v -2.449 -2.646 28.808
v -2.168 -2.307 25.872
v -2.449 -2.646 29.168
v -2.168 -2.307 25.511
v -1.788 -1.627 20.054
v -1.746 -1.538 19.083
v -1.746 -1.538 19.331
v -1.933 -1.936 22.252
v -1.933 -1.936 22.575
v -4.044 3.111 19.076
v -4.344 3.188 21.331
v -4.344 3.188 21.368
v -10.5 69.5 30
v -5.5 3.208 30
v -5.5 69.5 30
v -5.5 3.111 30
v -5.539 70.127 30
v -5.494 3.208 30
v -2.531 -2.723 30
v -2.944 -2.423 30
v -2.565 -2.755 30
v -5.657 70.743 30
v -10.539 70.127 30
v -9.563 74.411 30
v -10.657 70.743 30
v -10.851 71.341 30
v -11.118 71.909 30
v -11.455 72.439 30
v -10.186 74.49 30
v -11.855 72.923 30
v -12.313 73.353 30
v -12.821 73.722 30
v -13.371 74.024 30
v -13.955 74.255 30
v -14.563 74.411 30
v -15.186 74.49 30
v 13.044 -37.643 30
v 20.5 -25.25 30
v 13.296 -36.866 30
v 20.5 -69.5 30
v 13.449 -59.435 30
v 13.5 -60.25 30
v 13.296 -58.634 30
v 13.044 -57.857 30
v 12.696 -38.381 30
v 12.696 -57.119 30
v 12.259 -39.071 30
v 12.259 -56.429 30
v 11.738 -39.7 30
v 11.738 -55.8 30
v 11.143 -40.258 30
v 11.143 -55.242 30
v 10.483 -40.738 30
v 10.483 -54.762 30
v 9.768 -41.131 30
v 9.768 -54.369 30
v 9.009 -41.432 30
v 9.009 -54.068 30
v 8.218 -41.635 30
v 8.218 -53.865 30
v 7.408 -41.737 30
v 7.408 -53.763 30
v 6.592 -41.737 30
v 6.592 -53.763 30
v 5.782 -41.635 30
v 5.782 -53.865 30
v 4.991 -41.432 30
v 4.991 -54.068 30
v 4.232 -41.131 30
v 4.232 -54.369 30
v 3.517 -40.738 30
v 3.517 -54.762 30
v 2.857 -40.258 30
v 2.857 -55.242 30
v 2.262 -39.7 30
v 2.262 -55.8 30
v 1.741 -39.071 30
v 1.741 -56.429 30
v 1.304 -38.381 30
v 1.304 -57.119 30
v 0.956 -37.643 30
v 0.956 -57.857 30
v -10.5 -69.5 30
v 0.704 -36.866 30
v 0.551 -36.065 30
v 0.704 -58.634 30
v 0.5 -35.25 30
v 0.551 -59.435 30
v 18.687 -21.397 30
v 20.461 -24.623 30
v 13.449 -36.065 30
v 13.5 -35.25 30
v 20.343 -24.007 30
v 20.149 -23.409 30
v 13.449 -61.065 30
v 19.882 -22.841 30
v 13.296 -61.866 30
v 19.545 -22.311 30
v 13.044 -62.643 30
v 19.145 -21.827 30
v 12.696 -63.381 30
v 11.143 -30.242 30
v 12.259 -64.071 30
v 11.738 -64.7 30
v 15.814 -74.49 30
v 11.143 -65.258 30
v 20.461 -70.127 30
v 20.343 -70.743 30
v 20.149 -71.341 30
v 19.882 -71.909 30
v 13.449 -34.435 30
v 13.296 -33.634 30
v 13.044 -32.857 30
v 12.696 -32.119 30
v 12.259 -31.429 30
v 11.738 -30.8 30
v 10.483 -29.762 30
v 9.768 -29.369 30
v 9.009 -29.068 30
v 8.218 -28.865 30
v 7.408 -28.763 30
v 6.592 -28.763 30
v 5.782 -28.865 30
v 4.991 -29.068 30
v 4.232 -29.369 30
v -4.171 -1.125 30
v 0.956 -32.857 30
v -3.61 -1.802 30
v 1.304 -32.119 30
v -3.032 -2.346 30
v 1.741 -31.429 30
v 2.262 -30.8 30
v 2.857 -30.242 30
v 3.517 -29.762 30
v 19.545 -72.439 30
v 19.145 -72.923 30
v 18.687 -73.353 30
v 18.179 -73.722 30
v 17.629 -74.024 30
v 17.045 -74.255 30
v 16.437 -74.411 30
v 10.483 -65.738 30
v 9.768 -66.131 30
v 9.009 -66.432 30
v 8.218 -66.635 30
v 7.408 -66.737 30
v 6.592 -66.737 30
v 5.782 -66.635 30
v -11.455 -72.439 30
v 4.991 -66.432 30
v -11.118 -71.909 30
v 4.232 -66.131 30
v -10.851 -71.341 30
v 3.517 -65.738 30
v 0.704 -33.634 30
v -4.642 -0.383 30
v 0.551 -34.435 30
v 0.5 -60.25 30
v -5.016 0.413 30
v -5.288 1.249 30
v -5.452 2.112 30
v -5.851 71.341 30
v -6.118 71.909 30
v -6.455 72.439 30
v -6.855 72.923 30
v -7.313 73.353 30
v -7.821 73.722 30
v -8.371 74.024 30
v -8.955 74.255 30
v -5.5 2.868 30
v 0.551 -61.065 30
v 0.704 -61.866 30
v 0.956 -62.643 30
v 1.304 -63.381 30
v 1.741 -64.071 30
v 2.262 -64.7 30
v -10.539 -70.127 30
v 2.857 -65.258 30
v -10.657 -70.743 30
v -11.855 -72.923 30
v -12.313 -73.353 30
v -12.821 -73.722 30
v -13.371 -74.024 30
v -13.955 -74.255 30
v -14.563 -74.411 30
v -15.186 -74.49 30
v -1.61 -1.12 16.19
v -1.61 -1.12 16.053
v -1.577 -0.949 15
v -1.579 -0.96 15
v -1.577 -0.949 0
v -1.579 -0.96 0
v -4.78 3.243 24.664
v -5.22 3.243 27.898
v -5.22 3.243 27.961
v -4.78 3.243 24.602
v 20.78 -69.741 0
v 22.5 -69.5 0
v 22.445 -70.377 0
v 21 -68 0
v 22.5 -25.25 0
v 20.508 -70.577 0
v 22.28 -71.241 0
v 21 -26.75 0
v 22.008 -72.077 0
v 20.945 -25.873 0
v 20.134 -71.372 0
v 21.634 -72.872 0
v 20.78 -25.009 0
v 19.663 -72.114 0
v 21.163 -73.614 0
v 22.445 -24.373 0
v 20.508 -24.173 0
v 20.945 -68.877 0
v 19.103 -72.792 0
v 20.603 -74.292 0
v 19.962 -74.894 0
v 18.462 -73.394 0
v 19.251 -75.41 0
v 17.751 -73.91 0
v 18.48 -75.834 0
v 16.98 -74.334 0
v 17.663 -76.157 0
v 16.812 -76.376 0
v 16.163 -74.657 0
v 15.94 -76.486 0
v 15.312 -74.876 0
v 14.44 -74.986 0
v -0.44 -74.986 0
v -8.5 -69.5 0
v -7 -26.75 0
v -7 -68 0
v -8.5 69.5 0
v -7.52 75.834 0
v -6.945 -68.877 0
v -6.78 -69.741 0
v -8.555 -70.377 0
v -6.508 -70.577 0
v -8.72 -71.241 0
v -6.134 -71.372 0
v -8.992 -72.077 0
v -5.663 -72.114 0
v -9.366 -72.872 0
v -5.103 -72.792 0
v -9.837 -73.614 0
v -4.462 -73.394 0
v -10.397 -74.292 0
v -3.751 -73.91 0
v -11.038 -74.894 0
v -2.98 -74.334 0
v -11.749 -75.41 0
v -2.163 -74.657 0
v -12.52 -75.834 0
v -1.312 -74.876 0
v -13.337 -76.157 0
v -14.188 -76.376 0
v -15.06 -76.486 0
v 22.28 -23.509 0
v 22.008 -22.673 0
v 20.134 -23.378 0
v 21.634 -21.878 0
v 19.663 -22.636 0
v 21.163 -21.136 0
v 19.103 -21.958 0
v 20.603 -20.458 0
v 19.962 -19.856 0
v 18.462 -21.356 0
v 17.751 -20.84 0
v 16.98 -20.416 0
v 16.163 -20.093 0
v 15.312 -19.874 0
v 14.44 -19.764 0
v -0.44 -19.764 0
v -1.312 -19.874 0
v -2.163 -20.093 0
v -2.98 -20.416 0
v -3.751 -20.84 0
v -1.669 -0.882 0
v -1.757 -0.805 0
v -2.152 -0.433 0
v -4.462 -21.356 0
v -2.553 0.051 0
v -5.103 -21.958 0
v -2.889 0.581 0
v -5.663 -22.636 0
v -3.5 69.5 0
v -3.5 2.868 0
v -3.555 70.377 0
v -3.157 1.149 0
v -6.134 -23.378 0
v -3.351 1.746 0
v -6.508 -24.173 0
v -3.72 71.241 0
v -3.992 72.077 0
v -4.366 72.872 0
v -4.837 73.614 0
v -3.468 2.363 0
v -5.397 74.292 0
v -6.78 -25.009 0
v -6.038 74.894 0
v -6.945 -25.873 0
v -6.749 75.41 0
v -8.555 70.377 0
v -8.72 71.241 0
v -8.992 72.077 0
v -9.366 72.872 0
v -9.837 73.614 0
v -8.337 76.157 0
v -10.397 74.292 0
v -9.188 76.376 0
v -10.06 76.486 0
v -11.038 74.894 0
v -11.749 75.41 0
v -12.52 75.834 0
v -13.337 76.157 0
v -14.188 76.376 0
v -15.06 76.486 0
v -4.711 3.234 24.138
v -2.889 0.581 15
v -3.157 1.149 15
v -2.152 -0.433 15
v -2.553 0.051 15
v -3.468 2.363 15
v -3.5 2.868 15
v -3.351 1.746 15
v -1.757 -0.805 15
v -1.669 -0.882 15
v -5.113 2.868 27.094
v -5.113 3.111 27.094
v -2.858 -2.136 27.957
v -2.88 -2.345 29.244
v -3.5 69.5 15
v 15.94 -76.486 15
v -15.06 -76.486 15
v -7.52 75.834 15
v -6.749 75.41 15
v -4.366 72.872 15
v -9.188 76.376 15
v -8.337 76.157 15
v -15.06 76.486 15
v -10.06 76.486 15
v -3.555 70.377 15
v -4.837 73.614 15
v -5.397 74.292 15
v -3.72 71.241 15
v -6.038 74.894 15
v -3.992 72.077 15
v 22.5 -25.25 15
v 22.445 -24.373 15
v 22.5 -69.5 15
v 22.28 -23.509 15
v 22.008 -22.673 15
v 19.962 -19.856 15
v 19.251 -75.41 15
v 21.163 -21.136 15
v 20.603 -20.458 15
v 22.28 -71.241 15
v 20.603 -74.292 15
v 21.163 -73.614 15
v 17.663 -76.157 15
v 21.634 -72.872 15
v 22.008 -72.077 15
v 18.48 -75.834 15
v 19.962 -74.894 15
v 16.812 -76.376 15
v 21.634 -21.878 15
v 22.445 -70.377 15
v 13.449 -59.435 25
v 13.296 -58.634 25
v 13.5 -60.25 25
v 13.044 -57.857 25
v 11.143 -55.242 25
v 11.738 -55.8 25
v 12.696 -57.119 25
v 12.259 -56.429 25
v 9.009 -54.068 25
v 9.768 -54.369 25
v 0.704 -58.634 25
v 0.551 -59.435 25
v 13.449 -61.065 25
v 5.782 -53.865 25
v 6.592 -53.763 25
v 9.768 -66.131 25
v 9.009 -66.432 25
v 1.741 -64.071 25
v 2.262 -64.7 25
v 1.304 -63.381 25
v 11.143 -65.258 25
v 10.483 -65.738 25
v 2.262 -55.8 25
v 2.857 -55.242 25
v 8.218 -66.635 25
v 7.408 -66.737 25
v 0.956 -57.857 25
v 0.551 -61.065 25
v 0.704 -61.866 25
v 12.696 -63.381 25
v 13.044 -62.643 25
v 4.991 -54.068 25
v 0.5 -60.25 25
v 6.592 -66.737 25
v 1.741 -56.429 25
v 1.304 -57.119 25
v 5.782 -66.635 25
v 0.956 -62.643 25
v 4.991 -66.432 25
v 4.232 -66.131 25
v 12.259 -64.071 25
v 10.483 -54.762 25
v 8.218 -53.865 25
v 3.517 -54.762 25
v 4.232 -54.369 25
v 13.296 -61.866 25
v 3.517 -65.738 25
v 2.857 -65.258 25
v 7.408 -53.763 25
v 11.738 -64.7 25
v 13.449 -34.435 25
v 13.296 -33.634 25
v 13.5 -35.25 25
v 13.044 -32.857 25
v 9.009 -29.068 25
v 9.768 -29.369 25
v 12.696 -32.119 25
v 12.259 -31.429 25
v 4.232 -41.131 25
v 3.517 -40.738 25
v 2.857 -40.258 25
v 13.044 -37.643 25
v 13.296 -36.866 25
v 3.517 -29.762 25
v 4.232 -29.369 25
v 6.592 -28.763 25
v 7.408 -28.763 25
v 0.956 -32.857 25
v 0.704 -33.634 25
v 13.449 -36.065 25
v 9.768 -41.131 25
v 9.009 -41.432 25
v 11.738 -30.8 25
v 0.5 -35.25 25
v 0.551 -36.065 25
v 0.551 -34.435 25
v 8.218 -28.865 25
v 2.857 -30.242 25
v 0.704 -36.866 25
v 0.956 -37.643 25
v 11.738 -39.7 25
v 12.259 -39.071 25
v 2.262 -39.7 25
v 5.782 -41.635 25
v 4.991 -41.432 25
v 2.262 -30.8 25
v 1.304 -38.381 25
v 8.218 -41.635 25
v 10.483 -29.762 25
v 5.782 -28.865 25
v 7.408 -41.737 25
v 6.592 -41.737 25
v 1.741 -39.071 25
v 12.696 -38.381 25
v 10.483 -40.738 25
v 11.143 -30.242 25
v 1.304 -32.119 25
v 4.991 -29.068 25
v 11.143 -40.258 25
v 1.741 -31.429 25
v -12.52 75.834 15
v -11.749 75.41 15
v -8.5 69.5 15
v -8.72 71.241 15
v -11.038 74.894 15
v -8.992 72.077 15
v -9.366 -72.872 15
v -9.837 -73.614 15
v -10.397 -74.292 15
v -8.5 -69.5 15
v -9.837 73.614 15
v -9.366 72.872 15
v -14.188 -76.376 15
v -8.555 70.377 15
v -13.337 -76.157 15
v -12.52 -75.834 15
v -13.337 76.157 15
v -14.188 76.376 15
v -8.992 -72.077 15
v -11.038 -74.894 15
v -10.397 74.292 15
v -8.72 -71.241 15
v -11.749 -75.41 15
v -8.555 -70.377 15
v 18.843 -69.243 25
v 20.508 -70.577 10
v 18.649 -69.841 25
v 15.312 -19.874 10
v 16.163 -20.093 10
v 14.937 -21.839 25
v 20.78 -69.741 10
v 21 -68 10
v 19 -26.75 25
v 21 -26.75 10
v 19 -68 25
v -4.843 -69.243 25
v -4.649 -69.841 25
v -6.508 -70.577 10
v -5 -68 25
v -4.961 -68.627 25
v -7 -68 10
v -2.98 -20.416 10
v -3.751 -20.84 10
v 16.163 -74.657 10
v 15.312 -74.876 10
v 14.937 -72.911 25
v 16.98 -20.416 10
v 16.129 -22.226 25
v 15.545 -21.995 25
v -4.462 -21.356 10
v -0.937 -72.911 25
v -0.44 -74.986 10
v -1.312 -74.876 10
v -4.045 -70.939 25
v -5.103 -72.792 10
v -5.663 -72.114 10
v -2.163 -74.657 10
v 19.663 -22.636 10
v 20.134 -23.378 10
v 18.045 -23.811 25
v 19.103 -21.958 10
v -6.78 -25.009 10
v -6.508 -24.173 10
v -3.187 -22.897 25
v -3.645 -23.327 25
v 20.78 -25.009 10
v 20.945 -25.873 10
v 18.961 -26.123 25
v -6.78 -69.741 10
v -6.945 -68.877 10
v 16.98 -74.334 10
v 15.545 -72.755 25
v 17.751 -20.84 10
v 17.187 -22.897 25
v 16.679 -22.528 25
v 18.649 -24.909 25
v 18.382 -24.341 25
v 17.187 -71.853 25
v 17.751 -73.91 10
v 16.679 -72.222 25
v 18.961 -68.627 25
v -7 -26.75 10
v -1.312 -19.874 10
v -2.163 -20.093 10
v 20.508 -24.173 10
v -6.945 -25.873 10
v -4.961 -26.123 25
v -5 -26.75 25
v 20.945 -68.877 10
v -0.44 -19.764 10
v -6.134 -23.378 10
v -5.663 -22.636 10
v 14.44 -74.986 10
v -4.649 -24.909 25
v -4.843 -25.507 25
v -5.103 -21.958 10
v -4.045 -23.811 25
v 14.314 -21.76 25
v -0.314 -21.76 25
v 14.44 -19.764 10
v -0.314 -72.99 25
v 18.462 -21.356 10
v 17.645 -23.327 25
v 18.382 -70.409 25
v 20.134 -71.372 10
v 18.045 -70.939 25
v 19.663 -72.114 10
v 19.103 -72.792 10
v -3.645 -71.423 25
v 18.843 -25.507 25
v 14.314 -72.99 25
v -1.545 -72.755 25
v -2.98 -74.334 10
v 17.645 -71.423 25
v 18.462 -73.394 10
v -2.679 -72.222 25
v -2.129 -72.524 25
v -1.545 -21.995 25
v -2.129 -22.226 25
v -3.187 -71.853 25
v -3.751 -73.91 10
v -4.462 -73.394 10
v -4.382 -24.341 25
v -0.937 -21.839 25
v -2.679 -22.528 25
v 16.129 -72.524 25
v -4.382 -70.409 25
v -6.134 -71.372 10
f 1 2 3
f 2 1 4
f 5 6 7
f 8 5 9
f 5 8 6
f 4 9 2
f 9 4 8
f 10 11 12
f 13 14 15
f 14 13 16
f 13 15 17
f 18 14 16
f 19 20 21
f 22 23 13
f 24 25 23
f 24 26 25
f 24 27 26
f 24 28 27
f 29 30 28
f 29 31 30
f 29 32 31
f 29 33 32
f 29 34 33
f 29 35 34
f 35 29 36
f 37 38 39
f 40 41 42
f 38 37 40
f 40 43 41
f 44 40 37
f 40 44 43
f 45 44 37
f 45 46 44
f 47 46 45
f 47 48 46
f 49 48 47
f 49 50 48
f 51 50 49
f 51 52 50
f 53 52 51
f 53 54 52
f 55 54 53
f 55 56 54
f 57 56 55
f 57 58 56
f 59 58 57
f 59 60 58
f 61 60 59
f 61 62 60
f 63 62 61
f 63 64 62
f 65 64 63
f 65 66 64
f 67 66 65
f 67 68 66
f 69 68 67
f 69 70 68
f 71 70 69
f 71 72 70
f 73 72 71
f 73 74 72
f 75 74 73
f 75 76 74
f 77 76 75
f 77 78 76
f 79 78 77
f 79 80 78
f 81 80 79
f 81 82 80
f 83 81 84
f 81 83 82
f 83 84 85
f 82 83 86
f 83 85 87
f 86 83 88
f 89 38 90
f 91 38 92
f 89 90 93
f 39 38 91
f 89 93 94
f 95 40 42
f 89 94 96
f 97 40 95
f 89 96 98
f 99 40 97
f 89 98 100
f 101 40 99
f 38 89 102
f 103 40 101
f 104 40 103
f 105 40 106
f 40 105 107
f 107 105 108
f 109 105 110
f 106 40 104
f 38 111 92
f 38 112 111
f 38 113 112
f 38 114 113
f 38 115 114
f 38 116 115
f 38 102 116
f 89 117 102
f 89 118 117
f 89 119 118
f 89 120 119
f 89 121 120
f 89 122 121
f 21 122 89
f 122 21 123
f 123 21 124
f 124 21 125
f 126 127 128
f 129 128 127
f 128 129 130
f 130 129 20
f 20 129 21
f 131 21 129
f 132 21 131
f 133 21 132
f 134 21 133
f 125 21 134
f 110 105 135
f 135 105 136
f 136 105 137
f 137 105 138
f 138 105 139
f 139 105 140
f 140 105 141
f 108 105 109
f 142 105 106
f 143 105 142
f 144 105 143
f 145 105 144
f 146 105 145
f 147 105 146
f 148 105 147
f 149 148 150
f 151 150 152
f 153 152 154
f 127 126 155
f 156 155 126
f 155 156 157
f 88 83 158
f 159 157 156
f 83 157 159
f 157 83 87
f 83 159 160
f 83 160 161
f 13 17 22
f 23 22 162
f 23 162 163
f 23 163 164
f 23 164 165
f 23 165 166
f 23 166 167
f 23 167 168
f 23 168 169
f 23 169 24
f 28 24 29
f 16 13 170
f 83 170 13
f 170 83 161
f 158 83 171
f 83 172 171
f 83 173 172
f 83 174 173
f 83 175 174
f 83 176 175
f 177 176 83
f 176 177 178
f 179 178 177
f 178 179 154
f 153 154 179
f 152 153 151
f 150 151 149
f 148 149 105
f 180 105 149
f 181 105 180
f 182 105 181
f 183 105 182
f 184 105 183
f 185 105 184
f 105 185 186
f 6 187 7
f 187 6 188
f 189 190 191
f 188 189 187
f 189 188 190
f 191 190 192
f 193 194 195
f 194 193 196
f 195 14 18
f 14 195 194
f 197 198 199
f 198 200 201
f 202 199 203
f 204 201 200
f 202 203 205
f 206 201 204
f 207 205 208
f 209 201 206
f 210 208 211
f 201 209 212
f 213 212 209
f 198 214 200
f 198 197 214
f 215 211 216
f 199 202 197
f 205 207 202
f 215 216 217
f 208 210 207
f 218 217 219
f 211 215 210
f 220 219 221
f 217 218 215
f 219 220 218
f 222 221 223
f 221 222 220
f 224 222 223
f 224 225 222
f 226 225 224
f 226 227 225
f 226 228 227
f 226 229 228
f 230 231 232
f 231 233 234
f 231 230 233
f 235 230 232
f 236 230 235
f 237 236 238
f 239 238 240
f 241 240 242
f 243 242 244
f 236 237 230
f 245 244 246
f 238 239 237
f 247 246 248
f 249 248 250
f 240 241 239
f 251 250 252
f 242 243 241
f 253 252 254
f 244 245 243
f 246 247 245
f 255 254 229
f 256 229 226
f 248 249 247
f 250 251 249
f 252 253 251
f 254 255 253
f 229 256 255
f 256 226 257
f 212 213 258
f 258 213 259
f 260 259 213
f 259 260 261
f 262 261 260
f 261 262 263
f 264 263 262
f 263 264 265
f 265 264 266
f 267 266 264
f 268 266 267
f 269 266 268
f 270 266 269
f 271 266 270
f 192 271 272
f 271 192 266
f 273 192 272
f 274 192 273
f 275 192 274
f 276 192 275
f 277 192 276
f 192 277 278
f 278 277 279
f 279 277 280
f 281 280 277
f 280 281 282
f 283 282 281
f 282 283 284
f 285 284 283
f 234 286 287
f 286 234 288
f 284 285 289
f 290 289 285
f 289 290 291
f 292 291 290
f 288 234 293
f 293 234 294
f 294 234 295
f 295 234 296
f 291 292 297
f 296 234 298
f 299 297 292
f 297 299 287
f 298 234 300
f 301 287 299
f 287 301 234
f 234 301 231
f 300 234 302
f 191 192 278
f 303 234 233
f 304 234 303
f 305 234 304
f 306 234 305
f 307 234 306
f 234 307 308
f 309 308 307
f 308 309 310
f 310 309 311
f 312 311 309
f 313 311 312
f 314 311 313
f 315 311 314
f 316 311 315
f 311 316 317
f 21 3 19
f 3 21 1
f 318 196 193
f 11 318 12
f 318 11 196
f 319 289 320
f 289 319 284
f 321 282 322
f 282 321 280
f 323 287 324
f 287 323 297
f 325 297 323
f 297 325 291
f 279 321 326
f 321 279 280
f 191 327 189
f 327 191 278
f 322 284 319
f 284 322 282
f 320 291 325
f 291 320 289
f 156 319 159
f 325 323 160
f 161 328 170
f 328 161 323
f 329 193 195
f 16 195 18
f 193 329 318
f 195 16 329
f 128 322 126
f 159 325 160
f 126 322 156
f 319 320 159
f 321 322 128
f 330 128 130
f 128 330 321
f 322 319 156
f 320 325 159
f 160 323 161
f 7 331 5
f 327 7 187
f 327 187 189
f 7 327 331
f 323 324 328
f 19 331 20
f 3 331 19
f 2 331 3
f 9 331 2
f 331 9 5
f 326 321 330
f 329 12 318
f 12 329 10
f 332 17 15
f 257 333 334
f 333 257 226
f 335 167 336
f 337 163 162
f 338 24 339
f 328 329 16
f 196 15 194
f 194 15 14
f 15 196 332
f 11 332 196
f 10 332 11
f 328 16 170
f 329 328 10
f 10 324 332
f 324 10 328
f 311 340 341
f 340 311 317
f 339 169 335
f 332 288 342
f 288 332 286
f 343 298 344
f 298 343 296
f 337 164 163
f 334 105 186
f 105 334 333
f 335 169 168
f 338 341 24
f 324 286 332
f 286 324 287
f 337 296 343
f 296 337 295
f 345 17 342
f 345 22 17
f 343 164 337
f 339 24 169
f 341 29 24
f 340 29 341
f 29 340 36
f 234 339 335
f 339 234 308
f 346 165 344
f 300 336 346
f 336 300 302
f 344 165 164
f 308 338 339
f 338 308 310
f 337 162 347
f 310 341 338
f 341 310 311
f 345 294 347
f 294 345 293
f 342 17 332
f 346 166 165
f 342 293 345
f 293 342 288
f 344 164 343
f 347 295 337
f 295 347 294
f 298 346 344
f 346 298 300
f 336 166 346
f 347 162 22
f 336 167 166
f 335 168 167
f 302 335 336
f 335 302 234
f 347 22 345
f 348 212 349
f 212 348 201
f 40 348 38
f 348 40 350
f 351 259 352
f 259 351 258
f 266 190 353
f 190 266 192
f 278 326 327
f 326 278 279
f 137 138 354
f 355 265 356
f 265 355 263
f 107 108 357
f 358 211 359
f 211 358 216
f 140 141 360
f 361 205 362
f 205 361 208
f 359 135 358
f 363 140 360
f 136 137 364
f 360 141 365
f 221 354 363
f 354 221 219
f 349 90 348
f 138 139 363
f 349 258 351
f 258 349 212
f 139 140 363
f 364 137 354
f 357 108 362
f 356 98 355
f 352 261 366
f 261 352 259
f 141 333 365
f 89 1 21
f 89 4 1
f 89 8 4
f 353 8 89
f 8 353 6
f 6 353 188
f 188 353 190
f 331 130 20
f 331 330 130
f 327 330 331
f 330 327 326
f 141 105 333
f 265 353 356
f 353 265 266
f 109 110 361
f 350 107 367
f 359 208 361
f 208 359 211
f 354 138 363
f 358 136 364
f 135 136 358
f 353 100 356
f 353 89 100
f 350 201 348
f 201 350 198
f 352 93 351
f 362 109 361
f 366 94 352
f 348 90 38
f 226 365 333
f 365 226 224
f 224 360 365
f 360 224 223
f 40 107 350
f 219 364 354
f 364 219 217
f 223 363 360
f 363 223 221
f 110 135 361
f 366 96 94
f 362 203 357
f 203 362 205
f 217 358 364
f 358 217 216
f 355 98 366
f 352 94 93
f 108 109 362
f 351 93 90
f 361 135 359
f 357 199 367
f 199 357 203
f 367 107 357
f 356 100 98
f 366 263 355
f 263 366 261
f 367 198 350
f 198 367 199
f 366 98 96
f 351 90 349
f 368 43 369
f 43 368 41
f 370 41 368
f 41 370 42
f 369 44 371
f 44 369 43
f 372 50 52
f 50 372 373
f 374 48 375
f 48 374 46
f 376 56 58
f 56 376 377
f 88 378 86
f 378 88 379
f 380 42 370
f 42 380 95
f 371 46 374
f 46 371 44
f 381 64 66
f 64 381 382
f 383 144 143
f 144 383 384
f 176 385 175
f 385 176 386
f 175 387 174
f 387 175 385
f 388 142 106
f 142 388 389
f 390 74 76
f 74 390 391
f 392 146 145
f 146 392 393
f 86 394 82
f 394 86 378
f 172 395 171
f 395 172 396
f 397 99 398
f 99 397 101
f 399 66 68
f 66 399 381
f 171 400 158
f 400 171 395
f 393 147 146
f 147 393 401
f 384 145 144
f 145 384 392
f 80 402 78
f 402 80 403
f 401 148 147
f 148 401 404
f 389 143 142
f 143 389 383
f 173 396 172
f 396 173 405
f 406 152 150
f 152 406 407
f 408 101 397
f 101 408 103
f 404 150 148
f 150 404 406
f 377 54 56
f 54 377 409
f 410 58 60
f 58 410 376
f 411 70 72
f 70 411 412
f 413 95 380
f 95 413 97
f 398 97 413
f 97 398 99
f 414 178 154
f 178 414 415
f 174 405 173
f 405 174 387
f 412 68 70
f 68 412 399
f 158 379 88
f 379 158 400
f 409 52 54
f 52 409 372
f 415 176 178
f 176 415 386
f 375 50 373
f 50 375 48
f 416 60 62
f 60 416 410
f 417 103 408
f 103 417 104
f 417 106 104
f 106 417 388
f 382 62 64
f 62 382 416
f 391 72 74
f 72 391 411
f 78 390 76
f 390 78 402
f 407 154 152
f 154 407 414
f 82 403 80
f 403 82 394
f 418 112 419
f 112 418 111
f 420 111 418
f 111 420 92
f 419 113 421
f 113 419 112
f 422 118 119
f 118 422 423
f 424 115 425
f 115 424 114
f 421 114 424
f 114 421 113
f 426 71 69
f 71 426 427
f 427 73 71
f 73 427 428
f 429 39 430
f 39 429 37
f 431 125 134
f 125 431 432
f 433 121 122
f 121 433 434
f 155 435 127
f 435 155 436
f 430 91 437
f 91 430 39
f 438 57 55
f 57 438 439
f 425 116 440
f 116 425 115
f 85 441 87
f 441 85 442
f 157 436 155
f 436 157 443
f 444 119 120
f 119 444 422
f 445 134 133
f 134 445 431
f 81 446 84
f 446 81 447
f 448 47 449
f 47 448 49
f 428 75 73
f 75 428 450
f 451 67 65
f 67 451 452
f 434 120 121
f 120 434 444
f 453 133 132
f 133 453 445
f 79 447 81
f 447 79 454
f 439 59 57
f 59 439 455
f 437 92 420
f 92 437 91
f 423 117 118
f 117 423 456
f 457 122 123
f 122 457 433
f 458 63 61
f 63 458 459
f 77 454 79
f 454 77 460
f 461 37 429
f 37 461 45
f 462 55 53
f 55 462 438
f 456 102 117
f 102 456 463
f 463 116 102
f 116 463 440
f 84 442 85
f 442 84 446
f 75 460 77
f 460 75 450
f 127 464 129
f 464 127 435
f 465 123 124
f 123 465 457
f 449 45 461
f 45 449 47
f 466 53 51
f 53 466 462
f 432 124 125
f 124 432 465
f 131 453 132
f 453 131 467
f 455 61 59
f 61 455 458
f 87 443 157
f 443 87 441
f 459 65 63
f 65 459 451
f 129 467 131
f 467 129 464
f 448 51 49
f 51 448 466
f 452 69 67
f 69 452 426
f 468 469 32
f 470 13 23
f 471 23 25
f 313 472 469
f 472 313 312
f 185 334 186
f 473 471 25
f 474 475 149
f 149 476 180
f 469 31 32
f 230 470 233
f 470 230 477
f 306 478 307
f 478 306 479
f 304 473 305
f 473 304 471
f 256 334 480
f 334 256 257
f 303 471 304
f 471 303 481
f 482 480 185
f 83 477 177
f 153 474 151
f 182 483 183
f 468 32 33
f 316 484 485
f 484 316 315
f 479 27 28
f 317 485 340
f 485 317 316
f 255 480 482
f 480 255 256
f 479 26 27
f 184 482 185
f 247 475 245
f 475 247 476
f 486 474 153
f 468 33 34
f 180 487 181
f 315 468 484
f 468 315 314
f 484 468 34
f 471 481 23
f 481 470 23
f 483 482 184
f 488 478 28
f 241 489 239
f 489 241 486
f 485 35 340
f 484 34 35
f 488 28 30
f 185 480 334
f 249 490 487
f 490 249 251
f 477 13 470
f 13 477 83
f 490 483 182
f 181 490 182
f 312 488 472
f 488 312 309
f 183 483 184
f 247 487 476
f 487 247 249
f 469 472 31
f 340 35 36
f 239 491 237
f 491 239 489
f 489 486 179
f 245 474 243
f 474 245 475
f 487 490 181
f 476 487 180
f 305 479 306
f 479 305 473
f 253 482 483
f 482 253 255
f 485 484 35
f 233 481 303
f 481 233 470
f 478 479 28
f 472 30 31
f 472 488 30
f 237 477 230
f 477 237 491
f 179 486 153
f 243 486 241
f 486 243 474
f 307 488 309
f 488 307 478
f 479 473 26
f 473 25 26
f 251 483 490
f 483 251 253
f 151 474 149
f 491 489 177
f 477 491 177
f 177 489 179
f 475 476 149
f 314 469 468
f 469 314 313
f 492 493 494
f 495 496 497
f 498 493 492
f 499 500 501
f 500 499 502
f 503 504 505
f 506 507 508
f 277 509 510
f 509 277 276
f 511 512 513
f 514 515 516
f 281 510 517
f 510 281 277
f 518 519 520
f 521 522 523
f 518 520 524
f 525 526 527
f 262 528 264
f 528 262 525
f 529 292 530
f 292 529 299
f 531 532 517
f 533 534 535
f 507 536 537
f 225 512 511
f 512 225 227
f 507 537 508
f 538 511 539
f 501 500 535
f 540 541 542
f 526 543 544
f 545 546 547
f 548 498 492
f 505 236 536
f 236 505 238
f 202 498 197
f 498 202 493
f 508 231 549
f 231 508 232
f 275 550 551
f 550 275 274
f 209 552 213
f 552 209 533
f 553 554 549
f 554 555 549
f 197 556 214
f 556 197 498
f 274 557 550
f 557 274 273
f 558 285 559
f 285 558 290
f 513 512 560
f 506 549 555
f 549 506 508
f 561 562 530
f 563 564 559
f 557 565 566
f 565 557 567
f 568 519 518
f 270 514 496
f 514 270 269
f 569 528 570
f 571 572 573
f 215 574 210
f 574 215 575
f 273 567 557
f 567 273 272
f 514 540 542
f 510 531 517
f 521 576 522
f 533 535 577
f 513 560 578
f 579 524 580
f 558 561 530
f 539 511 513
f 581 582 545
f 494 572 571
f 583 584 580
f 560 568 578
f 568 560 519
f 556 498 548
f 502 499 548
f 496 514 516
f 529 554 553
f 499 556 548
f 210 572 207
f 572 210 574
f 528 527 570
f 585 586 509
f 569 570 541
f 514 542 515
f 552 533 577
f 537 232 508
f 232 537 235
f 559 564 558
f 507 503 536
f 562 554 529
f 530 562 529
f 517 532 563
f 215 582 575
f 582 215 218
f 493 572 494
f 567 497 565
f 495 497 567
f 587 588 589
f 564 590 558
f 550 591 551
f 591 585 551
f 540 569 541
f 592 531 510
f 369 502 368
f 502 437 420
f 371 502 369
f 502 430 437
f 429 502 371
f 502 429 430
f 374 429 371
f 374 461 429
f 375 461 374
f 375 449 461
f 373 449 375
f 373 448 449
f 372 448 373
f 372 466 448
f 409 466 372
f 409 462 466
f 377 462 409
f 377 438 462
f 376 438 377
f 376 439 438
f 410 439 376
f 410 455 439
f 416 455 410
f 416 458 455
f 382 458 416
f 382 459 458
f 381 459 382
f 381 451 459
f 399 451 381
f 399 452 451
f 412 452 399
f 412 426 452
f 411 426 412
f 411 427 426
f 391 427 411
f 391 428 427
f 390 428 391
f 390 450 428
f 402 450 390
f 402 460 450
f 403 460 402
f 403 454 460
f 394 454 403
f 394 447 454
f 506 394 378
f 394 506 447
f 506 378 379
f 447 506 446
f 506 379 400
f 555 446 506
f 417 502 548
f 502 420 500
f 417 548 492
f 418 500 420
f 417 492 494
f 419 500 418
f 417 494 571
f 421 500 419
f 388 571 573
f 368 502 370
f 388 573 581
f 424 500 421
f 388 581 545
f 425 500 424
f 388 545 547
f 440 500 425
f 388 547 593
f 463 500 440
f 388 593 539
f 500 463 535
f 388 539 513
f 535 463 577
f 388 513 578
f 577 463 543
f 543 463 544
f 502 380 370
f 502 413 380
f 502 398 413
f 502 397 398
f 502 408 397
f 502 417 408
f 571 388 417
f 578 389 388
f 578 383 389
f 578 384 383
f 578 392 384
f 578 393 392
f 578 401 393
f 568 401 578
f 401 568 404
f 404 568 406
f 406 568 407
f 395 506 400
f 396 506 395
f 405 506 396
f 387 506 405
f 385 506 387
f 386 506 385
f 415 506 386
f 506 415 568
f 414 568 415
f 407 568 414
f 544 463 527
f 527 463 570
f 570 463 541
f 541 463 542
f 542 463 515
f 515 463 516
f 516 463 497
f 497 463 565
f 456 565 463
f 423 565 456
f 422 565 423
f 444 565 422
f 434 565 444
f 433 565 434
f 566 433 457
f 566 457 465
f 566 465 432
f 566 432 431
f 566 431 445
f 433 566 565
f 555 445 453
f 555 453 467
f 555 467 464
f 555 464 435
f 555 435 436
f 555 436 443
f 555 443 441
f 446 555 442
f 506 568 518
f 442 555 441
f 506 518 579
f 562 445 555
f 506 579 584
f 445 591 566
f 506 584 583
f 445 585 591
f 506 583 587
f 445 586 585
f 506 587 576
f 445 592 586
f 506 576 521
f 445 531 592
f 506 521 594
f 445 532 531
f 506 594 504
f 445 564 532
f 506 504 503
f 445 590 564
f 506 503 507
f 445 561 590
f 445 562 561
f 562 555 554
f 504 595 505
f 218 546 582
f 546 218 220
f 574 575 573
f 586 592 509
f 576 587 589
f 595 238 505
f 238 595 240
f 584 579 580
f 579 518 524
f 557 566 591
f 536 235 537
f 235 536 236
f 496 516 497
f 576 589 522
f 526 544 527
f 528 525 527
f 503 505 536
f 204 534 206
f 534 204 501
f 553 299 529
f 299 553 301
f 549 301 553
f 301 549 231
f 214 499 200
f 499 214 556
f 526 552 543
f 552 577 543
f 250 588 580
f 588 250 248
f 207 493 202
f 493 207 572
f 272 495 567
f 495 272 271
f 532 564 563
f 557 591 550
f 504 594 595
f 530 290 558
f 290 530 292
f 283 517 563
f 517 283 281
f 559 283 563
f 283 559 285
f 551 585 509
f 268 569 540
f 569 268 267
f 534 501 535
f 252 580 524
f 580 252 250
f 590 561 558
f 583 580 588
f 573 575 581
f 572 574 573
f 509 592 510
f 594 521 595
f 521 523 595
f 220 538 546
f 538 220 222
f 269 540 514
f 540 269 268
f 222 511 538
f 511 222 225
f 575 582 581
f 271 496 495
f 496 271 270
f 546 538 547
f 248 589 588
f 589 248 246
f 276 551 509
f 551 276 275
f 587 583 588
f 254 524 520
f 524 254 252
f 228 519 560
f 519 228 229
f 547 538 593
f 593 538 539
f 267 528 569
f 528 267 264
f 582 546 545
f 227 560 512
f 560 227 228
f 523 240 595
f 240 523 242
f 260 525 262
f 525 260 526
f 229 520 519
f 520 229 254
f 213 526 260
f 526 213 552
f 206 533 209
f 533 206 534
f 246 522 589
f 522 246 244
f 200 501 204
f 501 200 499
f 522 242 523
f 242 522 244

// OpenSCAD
WALL_THICKNESS = 1.5;
PANEL_THICKNESS = 5;

DIA_TOP = 10;
DIA_BOT = 14;

LENGTH = 153;
WIDTH = 45;
HEIGHT = 15;

BNC_HOLE_DIA = 13;
BNC_HOLES = 2;
BNC_HOLE_SPACING = 25;
BNC_HOLE_OFFSET = 20 + BNC_HOLE_SPACING/2;


$fn = 50;

module outline() {
    cylinder(d = DIA_BOT, h = HEIGHT);
    translate([0, 0, HEIGHT])
    cylinder(d1 = DIA_BOT, d2 = DIA_TOP, h = HEIGHT);
}

module unit(w = WIDTH - DIA_BOT, l = LENGTH - DIA_BOT) {
  hull() {
    for(i = [-1, 1]) {
      for(j = [-1, 1]) {
        translate([i * w/2, j * l/2, 0])
        outline();
      }
    }
  }
}

module body() {
  union() {
    width = DIA_TOP/2;
    offset_w = -(WIDTH - DIA_BOT - width)/2;
    translate([offset_w, 0, 0])
    unit(w = width);

    length = (BNC_HOLES - 1) * BNC_HOLE_SPACING + BNC_HOLE_OFFSET/2 + 2 * WALL_THICKNESS;

    offset_l = -(LENGTH - DIA_BOT - length)/2;
    bend = offset_l + length/2 + BNC_HOLE_SPACING;

    hull() {
      translate([0, offset_l, 0])
      unit(l = length);

      #translate([offset_w, bend, 0])
      outline();
    }

    // This whole fillet is a giant mess.
    translate([offset_w, bend, 0])
    difference() {
      r = DIA_TOP/2 + DIA_BOT/2 + WALL_THICKNESS * 2 - 0.15;
      a = 12.6; // Should be asin(bend/something) :shrug:

      translate([-offset_w - DIA_TOP/2, 0, 0])
      cylinder(d = DIA_BOT/2, h = 2 * HEIGHT);
      #hull() {
        translate([r * cos(a), r * sin(a), 0])
        cylinder(d = DIA_TOP, h = HEIGHT);

        translate([r * cos(a), r * sin(a), 0])
        cylinder(d = DIA_TOP, h = HEIGHT);
      }
      #hull() {
        translate([r * cos(a), r * sin(a), HEIGHT])
        cylinder(d1 = DIA_TOP, d2 = DIA_BOT, h = HEIGHT);

        translate([r * cos(a), r * sin(a), HEIGHT])
        cylinder(d1 = DIA_TOP, d2 = DIA_BOT, h = HEIGHT);
      }
    }/**/
  }
}

module bnc_holes() {
  for(i = [0:BNC_HOLES-1]) {
    translate([0, BNC_HOLE_SPACING * i, 0])
    cylinder(d = BNC_HOLE_DIA, h = HEIGHT);
  }
}

module side_panel() {
  difference() {
    body();

    #translate([-WIDTH + DIA_BOT, 0, 0])
    unit();

    length = (BNC_HOLES - 1) * BNC_HOLE_SPACING + BNC_HOLE_OFFSET/2;
    placement = LENGTH - DIA_BOT - 2 * WALL_THICKNESS;
    #translate([DIA_BOT/2, -(placement - length)/2, -PANEL_THICKNESS])
    unit(WIDTH - 2 * DIA_BOT - 2 * WALL_THICKNESS, length);

    #translate([DIA_BOT/2, -(LENGTH - BNC_HOLE_OFFSET)/2, HEIGHT + PANEL_THICKNESS])
    bnc_holes();
  }
}

side_panel();
